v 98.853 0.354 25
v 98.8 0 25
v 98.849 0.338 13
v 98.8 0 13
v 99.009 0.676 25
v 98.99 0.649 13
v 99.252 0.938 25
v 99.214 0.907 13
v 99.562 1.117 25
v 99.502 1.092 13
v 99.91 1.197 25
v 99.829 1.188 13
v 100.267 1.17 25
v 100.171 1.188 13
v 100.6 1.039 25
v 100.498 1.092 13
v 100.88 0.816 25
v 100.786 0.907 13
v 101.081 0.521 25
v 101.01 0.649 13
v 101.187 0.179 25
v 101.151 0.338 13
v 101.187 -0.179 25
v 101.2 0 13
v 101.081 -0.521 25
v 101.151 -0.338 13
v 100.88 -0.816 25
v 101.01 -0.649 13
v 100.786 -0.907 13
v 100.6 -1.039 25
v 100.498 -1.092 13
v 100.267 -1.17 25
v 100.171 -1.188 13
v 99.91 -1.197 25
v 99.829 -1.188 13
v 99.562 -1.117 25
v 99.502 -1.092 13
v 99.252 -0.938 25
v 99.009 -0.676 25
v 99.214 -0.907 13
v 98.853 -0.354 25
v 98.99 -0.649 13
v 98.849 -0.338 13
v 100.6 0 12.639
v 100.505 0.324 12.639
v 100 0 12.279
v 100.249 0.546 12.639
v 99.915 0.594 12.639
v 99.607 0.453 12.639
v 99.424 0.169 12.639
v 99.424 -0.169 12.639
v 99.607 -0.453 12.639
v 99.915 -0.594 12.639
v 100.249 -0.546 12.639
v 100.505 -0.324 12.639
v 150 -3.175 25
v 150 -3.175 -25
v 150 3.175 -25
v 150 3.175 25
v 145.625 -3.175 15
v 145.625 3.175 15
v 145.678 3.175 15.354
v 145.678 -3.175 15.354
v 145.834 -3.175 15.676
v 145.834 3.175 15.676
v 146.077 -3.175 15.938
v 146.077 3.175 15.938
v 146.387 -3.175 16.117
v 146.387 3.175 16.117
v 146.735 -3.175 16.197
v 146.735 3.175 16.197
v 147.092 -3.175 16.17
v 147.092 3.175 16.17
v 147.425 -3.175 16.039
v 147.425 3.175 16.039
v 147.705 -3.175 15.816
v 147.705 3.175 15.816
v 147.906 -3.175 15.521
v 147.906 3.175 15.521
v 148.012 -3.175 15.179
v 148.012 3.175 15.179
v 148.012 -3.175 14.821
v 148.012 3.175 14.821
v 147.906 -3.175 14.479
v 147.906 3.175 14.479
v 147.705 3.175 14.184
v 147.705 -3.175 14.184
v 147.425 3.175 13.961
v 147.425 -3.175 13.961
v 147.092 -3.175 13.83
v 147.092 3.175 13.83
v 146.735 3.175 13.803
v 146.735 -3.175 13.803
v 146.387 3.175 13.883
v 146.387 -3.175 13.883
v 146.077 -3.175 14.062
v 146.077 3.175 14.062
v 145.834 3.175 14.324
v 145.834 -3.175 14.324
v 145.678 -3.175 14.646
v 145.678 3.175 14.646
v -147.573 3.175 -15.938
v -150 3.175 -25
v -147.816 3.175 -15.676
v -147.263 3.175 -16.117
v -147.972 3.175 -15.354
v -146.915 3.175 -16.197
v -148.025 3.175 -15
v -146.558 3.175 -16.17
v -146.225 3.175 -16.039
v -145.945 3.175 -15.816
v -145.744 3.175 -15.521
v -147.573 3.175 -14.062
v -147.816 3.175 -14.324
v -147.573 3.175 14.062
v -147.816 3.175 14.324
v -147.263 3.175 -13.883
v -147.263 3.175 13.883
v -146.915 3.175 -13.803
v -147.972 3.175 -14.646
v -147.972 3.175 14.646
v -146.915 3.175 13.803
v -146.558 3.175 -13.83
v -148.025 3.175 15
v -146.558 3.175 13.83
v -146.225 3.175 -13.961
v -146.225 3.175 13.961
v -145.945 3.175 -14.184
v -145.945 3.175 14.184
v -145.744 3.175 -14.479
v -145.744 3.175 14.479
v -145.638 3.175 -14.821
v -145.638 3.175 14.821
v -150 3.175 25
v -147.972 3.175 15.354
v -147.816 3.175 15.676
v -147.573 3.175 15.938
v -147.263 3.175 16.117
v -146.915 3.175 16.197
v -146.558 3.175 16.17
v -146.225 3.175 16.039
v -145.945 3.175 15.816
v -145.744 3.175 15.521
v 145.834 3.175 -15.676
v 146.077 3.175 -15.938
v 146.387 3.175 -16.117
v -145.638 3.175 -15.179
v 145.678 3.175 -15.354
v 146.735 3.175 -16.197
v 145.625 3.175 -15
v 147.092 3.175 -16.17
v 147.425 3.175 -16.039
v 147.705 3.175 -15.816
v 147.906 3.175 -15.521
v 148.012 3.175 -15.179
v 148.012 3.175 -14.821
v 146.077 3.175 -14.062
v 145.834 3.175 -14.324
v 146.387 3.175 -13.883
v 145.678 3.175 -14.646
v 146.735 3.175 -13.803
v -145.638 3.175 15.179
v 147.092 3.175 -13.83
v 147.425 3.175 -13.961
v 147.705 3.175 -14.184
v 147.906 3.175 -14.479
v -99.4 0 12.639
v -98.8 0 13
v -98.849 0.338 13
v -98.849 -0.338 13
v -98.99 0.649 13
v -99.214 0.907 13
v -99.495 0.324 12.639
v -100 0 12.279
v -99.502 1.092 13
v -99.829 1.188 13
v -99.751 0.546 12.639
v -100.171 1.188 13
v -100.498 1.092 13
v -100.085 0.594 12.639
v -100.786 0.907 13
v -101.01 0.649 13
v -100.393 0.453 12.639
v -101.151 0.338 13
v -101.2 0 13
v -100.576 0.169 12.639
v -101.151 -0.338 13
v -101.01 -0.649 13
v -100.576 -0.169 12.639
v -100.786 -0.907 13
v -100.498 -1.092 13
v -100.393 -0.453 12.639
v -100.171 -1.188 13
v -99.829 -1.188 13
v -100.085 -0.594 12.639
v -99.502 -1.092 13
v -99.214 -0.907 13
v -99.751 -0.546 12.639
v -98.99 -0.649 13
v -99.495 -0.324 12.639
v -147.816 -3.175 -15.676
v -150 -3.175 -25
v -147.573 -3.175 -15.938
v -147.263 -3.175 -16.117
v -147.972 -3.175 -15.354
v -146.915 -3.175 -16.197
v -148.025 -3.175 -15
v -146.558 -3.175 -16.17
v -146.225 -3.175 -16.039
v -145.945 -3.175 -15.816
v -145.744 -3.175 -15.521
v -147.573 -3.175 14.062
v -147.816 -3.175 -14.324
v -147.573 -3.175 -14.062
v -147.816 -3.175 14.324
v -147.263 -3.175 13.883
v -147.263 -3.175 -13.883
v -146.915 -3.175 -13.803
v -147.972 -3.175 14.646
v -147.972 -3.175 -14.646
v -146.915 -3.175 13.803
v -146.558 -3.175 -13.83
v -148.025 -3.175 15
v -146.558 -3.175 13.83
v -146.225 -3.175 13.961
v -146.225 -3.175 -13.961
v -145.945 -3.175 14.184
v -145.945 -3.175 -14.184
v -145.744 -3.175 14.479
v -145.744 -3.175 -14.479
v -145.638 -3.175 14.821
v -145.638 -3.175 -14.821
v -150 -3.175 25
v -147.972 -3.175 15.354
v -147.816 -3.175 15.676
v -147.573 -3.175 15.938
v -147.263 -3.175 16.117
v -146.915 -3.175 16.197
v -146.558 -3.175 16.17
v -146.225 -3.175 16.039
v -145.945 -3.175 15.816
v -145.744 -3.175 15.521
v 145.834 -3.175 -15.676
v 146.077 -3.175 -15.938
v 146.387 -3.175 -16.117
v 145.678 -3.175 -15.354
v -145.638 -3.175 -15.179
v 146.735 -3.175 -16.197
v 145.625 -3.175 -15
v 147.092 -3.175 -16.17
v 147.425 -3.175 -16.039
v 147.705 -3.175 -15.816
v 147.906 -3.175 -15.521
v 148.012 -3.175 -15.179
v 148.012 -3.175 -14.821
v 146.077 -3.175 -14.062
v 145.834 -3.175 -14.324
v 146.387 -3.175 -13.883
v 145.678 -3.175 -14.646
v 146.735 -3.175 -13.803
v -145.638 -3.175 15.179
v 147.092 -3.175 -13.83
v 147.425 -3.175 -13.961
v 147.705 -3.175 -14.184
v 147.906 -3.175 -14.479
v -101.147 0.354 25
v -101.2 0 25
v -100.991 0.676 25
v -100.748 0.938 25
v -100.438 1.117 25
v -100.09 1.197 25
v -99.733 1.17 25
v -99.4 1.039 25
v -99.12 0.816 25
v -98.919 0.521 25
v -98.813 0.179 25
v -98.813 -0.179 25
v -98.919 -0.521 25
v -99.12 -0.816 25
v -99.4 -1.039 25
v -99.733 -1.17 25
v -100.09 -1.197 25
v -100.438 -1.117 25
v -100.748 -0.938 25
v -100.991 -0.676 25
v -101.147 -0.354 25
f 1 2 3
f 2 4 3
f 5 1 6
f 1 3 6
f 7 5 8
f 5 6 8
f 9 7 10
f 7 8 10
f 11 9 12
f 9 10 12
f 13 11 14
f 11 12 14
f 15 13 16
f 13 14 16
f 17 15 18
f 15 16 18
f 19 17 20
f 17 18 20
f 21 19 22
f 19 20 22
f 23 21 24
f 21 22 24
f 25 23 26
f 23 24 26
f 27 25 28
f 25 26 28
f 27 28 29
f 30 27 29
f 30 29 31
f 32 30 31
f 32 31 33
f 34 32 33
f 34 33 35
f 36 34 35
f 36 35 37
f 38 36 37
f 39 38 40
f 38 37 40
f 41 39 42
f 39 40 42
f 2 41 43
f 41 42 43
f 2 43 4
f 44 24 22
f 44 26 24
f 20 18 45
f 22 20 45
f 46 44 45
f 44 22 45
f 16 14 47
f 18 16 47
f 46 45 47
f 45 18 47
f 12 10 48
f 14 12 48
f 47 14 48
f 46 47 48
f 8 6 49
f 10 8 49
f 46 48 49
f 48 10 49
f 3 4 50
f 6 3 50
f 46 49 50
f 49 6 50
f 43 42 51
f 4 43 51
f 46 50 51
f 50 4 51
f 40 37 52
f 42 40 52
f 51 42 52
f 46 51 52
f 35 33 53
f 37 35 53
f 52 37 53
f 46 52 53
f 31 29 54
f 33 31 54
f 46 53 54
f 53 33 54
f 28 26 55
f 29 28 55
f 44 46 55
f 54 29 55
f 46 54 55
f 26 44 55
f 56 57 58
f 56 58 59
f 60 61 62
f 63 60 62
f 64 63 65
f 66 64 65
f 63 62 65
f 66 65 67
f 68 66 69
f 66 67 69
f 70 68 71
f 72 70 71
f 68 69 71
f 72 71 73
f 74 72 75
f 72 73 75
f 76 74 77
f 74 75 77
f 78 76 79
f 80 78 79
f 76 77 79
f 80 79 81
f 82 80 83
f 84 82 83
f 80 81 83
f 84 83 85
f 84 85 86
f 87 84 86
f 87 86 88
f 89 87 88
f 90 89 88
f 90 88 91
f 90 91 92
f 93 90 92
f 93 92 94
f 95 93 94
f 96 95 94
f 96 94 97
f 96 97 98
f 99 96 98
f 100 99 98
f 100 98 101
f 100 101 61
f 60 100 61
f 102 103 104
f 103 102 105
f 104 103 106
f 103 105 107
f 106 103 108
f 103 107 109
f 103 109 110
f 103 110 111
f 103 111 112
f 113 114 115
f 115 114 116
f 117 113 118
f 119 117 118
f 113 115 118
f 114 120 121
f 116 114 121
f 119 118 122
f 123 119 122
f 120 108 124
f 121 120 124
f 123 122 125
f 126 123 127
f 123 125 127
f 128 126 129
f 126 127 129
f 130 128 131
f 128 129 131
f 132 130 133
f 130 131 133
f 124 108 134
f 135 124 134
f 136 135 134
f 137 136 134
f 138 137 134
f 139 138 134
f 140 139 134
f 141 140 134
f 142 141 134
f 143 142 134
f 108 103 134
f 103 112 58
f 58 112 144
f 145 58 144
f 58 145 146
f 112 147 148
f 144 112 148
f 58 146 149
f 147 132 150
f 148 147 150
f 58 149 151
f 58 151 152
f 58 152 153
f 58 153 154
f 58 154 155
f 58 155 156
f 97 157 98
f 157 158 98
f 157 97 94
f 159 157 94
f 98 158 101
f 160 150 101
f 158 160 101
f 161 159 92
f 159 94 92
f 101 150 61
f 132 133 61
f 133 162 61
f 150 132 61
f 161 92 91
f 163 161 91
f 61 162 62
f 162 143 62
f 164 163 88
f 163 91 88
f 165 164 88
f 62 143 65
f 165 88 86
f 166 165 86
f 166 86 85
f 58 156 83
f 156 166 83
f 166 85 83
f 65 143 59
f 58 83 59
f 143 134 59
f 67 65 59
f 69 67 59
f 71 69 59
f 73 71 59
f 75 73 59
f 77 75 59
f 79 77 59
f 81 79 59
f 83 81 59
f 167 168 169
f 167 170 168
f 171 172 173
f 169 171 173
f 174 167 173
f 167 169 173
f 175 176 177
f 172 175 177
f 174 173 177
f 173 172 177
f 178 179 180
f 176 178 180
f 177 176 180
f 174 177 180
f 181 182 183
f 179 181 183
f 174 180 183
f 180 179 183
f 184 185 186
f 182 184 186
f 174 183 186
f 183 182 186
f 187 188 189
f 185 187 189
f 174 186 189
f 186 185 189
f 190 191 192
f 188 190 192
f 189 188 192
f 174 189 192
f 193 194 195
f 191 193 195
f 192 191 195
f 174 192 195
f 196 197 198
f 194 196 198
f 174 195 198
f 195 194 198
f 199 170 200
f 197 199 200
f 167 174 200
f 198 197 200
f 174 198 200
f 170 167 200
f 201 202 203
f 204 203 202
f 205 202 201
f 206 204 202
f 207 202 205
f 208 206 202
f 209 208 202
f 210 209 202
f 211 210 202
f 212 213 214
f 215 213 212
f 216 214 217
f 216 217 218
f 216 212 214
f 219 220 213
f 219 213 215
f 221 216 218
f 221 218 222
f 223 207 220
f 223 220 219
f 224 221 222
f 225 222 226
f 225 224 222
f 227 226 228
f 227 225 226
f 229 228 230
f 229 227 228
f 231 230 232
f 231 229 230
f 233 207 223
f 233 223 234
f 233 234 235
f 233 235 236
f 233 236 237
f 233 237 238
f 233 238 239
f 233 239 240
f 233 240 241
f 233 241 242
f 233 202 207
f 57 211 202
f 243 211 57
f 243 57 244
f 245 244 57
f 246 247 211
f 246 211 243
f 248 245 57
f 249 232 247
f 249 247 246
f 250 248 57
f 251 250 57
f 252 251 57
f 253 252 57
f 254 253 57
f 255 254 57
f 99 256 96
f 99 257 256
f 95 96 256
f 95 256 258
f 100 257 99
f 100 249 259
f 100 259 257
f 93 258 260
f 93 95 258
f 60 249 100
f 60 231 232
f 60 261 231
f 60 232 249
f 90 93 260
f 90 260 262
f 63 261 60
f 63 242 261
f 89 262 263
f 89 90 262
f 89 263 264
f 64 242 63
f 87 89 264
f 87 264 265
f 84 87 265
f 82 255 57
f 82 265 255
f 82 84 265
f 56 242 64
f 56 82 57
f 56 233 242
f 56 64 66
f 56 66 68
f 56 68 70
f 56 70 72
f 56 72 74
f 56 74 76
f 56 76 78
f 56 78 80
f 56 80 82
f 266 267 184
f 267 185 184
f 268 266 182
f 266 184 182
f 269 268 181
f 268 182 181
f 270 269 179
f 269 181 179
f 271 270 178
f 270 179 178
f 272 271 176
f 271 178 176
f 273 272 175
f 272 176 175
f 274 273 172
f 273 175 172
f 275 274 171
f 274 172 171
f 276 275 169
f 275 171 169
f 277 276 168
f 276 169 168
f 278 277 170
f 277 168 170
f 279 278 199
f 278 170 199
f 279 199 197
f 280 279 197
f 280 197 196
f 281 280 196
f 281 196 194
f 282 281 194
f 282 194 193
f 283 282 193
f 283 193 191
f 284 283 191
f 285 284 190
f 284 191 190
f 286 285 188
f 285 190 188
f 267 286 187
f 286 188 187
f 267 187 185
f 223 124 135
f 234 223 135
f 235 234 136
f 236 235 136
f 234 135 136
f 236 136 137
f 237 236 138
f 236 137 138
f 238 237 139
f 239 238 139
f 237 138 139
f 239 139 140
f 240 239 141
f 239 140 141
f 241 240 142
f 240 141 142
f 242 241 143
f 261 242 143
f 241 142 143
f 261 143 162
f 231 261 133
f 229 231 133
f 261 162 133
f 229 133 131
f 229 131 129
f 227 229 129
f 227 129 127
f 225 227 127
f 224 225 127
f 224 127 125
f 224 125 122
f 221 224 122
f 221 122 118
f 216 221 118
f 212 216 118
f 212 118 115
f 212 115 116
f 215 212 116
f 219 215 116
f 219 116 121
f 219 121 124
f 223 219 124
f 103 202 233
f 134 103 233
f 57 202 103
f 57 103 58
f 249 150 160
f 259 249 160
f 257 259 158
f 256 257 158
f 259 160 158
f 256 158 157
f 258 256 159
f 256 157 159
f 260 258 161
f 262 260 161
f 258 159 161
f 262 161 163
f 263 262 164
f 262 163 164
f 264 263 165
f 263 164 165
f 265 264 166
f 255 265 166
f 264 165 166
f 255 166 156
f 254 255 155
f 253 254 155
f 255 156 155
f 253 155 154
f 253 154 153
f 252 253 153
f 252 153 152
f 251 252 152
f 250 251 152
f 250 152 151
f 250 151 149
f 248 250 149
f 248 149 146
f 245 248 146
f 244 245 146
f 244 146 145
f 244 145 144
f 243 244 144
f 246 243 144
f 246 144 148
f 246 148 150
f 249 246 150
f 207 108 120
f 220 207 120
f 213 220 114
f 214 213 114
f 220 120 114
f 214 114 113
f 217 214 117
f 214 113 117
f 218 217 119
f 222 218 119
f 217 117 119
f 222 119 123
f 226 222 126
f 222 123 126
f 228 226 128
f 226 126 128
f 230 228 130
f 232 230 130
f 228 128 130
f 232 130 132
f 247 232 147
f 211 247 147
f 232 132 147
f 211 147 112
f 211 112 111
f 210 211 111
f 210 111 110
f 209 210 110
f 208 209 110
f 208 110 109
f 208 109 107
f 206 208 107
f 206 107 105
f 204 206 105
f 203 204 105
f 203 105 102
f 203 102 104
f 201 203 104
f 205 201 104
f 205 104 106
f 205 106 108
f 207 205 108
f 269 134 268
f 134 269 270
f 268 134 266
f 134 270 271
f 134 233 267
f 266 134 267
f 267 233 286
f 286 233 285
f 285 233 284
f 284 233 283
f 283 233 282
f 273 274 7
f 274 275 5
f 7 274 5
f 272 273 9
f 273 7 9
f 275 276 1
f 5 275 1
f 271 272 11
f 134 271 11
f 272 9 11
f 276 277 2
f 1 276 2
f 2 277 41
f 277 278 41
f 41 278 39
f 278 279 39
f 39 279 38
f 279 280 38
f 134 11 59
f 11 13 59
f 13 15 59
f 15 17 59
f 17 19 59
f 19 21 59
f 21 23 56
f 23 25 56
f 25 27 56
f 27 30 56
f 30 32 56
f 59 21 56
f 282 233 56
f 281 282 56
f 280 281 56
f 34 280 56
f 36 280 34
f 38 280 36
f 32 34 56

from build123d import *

# Parameters (mm, degrees)
F0_W     = 300
F0_H     = 50
F1_DEPTH = 3.175
F3_D     = 2.4
F5_D     = 2.4
F5_DEPTH = 12
F5_TIP   = 0.7210327428


with BuildPart() as f1:
    # F0 (on Front) → F1 (new body, symmetric)
    with BuildSketch(Plane.XZ):
        Rectangle(F0_W, F0_H)
    extrude(amount=F1_DEPTH, both=True)

    # F3 (through all)
    with Locations(Plane.XZ.offset(3.175)):
        with Locations((-146.825, 15), (-146.825, -15), (146.825, 15), (146.825, -15)):
            Hole(F3_D / 2)

    # F5
    with Locations(Plane.XY.offset(25)):
        with Locations((-100, 0), (100, 0)):
            Hole(F5_D / 2, depth=F5_DEPTH)
            with Locations((0, 0, -(F5_DEPTH + F5_TIP / 2))):  # 118° drill point
                Cone(0, F5_D / 2, F5_TIP, mode=Mode.SUBTRACT)


solid = f1.part
